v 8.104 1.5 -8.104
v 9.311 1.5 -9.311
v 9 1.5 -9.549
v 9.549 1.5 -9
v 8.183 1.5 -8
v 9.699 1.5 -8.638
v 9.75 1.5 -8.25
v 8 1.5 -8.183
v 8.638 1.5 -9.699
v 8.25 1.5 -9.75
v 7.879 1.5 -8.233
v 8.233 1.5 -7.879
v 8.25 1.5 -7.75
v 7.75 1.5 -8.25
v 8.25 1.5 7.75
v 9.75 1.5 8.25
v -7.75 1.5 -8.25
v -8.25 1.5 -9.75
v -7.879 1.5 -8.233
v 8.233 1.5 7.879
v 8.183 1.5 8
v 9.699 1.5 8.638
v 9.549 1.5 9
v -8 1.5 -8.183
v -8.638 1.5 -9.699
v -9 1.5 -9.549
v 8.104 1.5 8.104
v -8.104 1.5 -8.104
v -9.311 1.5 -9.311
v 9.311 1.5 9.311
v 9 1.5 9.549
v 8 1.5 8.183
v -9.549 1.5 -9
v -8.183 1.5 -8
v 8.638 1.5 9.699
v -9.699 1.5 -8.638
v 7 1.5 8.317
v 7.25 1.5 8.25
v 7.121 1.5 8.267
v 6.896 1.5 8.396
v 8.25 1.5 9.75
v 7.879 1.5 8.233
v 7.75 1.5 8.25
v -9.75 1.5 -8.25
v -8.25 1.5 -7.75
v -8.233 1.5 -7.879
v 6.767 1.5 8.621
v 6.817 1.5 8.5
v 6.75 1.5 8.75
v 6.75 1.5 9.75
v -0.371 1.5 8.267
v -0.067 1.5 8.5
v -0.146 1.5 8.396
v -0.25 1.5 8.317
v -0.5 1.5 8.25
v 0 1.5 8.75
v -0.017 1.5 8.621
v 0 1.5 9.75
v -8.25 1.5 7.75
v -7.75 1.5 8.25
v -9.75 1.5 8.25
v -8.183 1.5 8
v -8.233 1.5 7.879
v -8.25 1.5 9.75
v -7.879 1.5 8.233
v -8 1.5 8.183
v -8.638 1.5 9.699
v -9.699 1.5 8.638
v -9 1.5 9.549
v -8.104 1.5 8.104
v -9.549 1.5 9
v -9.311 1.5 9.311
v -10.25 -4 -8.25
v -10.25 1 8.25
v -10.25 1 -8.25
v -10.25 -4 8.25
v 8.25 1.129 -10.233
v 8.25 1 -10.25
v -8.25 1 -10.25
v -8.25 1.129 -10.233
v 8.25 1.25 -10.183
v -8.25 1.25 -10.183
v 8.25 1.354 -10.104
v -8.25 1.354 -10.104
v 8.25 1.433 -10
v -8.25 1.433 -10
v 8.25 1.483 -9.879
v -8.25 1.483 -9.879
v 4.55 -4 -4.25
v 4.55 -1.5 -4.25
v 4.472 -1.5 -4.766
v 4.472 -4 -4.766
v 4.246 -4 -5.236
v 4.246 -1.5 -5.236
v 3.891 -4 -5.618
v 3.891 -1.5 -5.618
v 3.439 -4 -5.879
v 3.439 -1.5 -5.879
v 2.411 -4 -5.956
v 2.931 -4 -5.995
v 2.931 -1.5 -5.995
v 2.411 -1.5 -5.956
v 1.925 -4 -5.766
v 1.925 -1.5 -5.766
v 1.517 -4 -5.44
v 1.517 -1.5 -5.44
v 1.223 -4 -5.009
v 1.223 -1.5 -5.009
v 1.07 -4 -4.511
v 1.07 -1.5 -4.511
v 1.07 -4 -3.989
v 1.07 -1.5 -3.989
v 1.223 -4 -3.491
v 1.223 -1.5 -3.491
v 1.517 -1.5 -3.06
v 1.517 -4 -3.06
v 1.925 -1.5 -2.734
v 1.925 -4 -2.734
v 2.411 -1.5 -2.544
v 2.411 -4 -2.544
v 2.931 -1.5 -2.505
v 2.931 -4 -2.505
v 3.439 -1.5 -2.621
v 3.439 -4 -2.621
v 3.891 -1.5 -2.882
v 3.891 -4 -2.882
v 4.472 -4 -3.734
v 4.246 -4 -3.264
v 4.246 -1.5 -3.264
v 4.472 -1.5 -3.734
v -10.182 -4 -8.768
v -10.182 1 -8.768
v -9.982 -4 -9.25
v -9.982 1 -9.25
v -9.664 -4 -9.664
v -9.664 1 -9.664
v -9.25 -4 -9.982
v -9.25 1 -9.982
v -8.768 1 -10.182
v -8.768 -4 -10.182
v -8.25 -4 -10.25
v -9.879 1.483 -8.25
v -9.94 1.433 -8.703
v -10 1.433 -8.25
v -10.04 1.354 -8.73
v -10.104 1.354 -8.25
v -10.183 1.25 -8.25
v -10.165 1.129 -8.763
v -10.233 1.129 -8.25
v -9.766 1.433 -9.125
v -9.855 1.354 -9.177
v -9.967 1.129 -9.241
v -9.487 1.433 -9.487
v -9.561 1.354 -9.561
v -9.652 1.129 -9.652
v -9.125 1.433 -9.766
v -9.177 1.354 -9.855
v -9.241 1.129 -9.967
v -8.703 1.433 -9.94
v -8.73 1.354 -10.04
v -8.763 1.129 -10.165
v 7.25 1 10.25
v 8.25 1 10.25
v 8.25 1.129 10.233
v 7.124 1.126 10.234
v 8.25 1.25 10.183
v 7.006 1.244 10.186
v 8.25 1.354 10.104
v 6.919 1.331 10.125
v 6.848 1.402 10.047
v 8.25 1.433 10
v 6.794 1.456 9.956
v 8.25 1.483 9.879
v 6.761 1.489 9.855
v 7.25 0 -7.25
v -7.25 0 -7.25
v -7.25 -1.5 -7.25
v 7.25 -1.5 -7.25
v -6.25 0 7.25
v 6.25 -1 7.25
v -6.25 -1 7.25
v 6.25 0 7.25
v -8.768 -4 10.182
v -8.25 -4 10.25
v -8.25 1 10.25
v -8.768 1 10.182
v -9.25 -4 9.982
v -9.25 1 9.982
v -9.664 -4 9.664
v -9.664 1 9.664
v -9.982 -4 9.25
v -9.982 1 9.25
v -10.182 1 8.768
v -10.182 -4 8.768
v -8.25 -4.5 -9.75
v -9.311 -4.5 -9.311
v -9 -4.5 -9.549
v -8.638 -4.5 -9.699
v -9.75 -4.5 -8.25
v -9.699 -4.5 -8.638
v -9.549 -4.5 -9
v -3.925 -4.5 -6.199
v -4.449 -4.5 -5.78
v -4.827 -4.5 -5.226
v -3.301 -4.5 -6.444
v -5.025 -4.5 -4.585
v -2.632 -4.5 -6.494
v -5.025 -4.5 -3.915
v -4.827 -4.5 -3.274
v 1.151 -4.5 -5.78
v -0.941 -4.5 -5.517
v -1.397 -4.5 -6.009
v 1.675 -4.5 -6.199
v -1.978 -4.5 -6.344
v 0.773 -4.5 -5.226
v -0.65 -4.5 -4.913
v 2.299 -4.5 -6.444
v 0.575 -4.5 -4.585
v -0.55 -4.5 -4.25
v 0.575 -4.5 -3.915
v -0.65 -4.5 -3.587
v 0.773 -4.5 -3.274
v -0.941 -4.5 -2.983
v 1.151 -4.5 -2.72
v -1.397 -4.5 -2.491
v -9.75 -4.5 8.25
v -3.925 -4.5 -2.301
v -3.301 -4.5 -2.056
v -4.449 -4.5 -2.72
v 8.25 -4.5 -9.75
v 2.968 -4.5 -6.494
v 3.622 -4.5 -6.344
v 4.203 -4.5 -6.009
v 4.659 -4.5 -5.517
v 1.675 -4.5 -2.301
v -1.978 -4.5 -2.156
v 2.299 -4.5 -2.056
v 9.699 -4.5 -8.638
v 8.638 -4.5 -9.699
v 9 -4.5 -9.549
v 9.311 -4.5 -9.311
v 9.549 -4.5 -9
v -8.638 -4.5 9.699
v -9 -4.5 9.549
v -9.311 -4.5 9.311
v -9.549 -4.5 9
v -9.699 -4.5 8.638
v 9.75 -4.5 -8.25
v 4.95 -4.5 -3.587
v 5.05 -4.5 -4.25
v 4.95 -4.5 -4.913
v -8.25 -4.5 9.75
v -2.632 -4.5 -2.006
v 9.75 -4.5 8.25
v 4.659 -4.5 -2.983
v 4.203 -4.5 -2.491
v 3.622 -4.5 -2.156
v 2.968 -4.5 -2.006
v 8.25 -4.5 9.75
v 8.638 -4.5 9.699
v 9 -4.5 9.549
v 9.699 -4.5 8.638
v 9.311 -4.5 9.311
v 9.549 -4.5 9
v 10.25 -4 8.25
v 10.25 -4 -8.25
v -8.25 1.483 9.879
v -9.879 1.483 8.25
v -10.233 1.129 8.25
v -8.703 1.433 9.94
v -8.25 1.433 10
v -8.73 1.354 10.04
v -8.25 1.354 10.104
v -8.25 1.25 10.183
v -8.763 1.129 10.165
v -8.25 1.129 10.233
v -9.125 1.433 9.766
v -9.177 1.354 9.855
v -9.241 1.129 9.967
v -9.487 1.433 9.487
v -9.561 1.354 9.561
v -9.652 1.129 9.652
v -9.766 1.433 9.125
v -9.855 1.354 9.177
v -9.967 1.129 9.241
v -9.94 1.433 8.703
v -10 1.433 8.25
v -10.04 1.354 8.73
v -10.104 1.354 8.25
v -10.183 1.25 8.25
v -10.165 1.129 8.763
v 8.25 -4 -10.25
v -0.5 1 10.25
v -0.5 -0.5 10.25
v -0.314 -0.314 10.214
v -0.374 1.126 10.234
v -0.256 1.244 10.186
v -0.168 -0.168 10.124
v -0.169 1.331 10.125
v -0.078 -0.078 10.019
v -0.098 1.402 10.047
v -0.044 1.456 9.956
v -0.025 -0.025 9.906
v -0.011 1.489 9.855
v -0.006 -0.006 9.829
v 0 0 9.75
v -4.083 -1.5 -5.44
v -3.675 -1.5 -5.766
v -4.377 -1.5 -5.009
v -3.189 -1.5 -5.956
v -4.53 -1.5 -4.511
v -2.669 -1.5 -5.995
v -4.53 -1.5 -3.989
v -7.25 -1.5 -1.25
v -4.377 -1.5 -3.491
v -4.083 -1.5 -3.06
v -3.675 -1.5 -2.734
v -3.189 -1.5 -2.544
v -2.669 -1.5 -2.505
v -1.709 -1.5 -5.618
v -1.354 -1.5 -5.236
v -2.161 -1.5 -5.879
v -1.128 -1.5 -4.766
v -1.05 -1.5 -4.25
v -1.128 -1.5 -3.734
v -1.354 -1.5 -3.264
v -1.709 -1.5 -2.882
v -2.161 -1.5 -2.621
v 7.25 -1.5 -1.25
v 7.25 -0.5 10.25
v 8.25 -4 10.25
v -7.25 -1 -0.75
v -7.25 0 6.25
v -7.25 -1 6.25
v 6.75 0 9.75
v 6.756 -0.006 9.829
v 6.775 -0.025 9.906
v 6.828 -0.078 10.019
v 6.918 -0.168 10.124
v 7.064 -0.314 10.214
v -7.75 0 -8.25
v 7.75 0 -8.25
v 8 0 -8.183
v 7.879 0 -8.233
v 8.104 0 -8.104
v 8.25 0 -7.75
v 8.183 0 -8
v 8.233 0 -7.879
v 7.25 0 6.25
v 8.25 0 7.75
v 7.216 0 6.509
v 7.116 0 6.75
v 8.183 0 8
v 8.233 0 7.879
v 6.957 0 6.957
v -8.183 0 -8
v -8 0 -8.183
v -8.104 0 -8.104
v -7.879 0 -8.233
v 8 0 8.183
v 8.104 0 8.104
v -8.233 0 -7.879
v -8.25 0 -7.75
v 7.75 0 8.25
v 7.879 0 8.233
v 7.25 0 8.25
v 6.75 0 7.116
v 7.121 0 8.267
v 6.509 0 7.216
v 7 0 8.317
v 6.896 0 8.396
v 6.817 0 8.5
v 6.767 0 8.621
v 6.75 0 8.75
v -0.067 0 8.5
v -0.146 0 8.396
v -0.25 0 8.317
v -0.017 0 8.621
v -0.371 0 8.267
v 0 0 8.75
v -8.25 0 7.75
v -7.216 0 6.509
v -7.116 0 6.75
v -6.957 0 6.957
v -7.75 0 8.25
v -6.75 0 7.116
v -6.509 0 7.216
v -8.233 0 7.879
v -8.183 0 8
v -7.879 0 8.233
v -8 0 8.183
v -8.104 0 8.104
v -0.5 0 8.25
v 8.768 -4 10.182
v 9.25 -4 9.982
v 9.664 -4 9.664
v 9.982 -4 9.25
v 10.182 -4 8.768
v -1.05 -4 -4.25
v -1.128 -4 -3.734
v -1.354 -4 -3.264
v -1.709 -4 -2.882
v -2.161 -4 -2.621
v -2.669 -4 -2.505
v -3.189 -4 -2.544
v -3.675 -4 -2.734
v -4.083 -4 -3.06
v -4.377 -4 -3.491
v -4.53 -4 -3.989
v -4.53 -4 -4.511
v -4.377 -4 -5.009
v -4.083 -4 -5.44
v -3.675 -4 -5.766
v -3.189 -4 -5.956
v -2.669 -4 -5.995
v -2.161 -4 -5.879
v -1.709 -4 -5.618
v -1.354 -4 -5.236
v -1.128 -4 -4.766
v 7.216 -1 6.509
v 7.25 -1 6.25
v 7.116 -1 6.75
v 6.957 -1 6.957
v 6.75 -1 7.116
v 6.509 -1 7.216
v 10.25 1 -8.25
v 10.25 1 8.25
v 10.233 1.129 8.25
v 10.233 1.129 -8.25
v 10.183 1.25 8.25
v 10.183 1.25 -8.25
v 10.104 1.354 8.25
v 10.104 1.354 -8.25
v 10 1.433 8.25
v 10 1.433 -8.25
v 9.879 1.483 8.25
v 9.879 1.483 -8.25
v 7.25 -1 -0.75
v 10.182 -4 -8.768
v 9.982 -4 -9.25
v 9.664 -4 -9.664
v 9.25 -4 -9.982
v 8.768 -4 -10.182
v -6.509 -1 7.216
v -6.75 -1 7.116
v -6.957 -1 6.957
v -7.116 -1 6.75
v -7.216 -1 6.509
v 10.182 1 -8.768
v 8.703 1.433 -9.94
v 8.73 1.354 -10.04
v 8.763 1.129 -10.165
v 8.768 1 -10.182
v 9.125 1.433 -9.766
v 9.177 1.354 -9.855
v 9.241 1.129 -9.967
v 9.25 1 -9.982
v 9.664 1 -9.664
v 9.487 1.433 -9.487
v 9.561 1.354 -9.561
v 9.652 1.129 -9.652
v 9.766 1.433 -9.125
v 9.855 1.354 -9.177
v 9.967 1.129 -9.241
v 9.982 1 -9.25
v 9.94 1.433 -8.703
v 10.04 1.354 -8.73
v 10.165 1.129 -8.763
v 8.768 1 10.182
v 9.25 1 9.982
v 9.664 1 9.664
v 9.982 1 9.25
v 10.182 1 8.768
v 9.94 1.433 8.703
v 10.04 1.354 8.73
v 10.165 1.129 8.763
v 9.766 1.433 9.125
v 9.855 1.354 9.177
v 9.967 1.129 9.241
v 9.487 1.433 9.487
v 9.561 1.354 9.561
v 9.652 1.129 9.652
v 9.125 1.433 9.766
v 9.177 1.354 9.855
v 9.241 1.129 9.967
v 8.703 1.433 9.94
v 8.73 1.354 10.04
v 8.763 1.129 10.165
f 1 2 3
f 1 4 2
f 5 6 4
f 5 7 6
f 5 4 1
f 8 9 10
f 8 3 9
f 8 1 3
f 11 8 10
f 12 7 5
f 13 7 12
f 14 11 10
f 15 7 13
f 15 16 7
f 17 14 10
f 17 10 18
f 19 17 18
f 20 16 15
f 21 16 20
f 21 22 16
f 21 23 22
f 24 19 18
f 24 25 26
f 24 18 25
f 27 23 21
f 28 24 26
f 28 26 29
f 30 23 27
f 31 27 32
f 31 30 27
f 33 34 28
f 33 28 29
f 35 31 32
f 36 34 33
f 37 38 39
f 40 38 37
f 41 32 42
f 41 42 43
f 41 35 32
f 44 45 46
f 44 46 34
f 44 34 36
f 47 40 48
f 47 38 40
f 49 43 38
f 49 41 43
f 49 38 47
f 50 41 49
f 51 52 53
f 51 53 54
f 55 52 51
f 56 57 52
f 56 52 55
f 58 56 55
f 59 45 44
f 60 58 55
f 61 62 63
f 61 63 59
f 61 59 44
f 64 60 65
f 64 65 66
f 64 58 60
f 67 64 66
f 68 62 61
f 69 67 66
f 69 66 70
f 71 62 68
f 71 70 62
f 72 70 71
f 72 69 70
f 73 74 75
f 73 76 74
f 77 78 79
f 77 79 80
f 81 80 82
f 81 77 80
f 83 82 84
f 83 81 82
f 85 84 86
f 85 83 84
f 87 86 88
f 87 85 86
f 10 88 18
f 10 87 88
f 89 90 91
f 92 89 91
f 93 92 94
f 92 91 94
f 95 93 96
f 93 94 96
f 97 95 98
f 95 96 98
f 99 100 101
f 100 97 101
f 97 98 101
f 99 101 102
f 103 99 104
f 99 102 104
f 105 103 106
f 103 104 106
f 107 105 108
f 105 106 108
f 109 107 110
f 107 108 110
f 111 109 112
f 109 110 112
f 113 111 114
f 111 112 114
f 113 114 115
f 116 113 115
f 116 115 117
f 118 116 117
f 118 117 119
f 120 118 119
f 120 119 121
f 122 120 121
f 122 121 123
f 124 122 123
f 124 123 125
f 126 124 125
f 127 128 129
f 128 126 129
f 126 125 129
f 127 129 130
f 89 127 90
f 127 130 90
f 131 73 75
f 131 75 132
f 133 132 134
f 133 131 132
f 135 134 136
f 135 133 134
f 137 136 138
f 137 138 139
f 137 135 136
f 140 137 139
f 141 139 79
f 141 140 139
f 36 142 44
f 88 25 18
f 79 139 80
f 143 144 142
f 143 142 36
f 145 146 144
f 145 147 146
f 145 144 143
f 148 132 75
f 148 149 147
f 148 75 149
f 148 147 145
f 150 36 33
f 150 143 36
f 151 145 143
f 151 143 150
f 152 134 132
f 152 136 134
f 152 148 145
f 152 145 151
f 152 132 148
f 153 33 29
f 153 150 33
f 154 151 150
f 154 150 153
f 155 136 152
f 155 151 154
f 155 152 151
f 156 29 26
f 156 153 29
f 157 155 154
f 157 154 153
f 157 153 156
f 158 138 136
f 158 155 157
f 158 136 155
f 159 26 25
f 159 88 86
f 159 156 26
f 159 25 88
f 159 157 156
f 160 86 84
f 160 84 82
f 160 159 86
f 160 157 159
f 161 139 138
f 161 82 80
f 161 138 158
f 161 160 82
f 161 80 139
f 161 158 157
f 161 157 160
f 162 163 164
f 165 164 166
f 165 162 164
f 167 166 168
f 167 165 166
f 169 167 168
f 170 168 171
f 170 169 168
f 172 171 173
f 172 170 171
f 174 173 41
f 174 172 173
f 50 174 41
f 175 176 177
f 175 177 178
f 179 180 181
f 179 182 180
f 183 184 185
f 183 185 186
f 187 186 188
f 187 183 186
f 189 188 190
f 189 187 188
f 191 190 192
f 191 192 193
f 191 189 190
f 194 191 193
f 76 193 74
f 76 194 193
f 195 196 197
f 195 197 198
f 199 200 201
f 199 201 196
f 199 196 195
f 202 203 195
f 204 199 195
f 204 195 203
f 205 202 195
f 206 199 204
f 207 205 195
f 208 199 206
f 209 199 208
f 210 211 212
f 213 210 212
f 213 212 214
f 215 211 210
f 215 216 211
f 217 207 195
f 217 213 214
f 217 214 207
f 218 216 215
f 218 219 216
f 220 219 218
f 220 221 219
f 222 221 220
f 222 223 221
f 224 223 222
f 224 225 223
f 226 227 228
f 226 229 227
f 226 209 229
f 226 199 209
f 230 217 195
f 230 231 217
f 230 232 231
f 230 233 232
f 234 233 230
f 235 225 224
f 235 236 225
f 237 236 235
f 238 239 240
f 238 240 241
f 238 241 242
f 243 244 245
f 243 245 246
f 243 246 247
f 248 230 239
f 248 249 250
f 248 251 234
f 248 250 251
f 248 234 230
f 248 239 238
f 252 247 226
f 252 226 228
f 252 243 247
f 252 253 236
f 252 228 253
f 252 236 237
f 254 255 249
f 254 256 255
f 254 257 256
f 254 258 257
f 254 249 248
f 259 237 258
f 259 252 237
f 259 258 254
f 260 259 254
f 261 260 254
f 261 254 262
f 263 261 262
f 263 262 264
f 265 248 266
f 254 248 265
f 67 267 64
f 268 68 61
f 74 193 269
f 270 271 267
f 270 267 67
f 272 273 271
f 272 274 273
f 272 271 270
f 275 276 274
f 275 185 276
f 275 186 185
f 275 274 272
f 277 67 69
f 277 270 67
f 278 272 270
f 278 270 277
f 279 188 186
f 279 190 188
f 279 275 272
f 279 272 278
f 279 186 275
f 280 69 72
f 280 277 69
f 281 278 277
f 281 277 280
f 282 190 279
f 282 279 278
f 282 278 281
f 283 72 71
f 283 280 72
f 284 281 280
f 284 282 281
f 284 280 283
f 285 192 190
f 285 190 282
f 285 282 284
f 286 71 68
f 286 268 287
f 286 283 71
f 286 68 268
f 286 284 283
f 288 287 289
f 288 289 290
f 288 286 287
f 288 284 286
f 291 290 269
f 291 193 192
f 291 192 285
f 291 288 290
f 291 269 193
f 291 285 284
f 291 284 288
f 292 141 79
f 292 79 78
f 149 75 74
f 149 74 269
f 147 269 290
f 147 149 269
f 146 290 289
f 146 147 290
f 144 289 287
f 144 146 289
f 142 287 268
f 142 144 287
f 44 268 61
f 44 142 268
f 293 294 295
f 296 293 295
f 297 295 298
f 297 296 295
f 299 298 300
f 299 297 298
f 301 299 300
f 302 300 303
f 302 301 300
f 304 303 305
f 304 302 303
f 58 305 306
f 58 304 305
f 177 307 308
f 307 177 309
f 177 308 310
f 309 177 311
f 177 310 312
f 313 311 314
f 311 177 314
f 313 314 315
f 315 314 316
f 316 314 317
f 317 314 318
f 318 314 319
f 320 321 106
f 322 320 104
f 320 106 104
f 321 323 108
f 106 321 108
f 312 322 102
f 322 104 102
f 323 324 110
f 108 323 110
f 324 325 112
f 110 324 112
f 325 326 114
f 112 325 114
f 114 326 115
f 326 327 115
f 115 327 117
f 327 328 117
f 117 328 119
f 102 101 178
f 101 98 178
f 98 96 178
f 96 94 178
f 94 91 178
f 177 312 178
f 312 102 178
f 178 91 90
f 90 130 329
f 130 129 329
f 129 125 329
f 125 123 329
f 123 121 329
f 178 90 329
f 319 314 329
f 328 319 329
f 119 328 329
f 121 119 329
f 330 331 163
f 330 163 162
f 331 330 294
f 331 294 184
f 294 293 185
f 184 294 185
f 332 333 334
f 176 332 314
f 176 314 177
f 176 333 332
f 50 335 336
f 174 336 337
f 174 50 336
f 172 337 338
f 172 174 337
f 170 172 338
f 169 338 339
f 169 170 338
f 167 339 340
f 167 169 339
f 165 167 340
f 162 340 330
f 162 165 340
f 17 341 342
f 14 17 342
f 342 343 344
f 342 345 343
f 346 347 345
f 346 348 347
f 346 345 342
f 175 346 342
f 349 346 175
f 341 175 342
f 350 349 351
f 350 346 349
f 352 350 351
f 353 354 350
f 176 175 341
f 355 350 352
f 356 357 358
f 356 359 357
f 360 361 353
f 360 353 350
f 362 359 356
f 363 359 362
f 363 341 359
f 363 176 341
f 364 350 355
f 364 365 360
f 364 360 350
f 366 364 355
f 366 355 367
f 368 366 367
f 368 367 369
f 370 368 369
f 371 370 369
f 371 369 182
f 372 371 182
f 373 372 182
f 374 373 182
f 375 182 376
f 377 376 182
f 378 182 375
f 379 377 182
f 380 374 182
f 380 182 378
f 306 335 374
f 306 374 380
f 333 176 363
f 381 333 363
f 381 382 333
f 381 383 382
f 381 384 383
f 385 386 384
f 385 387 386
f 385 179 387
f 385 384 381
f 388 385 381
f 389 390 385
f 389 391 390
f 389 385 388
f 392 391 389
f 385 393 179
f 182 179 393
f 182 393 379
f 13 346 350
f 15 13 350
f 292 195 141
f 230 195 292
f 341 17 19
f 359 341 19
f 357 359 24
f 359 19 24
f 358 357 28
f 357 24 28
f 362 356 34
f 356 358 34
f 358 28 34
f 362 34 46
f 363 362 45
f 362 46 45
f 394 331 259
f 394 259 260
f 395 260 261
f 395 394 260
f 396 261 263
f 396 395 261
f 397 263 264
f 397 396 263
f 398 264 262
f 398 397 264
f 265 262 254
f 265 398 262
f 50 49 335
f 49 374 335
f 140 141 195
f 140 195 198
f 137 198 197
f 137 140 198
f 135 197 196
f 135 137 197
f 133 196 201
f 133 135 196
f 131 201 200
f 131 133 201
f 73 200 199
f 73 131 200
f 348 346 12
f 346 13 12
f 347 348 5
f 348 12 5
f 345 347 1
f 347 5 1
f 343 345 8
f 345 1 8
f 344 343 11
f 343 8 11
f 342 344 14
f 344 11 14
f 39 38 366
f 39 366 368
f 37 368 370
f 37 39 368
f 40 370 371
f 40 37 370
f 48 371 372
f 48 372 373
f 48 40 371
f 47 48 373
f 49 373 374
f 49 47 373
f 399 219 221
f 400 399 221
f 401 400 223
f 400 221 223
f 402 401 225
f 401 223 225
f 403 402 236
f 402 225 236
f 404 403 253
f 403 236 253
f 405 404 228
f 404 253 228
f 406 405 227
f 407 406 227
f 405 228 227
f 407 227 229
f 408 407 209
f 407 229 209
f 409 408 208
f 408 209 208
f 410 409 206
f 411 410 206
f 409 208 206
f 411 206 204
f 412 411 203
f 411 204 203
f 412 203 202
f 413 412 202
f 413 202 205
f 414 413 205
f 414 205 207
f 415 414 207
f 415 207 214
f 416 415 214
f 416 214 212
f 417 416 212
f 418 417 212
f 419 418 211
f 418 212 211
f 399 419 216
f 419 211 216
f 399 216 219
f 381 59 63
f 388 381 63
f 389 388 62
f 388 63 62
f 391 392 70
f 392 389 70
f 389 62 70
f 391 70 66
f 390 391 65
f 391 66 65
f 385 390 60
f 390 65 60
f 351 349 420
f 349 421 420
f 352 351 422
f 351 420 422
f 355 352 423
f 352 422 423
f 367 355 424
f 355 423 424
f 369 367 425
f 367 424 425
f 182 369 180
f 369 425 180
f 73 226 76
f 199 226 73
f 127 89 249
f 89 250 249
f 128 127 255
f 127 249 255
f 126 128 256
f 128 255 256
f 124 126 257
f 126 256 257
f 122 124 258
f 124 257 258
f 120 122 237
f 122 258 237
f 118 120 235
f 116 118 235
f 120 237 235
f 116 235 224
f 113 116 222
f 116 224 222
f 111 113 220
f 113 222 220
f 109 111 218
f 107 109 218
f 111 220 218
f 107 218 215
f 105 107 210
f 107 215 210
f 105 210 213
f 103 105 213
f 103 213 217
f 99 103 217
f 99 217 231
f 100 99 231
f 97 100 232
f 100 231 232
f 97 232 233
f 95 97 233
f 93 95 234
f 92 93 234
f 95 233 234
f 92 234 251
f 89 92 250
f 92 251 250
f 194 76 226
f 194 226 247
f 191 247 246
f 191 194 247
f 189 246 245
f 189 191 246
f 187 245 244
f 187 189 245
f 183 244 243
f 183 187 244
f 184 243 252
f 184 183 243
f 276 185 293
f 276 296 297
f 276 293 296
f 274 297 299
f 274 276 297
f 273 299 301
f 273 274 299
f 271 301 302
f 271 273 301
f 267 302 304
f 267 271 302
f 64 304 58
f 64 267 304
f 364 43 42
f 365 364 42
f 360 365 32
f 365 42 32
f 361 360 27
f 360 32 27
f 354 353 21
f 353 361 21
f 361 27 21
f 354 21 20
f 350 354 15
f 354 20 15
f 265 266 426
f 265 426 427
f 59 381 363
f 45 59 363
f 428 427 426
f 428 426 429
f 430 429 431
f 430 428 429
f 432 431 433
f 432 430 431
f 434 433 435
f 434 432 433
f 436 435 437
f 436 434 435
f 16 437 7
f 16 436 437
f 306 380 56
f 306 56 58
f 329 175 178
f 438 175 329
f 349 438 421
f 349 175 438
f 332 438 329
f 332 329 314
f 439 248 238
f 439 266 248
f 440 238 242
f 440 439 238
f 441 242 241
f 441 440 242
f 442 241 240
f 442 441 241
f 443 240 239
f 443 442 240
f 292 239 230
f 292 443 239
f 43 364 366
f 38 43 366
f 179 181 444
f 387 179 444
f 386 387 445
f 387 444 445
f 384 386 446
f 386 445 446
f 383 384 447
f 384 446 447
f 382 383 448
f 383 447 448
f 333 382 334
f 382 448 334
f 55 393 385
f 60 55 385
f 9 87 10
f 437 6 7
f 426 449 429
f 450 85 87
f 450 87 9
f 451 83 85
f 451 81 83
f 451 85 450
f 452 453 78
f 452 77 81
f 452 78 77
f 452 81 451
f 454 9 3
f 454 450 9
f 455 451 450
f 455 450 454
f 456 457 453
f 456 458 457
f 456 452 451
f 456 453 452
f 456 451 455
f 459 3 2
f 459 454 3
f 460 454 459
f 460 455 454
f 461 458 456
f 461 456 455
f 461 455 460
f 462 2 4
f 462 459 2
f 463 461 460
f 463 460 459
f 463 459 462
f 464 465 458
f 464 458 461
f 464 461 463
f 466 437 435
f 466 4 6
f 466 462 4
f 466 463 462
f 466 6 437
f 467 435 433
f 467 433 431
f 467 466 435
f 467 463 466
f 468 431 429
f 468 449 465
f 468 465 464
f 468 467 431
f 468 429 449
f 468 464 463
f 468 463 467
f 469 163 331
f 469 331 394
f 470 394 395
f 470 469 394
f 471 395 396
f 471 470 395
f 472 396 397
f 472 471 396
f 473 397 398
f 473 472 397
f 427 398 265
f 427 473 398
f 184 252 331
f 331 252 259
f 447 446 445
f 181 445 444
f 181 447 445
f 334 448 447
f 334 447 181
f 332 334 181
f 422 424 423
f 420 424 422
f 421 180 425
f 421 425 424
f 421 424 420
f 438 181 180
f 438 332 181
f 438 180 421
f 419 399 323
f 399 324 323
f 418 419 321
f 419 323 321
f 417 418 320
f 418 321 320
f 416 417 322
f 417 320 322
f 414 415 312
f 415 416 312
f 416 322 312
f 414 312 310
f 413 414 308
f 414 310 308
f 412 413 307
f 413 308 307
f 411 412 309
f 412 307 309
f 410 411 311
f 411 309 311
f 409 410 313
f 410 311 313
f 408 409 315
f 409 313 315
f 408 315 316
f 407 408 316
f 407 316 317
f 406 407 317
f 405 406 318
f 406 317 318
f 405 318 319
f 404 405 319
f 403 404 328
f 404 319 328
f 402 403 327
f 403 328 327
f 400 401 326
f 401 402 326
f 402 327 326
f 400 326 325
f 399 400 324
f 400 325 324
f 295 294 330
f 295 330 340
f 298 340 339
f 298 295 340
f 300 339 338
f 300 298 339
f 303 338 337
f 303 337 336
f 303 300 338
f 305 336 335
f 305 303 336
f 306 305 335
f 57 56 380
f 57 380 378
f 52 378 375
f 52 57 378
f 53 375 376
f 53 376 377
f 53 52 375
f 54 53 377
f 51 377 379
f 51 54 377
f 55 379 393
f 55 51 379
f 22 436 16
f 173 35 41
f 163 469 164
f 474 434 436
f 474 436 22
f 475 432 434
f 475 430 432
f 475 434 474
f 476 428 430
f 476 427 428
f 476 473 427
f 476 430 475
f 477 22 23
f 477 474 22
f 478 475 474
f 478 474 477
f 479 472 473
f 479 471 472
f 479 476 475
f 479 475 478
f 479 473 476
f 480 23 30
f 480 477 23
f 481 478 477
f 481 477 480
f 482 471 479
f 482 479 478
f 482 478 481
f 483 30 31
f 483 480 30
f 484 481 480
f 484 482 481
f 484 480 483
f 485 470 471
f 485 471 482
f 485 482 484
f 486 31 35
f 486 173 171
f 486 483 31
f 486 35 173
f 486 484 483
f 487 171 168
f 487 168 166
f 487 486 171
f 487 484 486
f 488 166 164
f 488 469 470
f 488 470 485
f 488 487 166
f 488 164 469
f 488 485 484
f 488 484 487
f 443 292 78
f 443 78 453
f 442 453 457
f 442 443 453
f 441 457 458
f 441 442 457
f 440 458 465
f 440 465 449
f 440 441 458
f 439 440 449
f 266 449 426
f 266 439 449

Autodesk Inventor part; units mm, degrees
ref_plane "YZ Plane" through (0, 0, 0) normal (1, 0, 0) x (0, 1, 0)
ref_plane "XZ Plane" through (0, 0, 0) normal (0, 1, 0) x (-1, 0, 0)
ref_plane "XY Plane" through (0, 0, 0) normal (0, 0, 1) x (1, 0, 0)
sketch "Sketch1" plane through (0, 0, 0) normal (0, 1, 0) x (-1, 0, 0)
  line L0 (8, 8) -> (-8, 8) construction
  line L1 (-8, 8) -> (-8, -8) construction
  line L2 (-8, -8) -> (8, -8) construction
  line L3 (8, -8) -> (8, 8) construction
  line L4 (8, 8) -> (-8, -8) construction
  line L5 (-8, 8) -> (8, -8) construction
  line L6 (-8.25, 8.25) -> (8.25, 8.25)
  line L7 (8.25, 8.25) -> (8.25, -8.25)
  line L8 (8.25, -8.25) -> (-8.25, -8.25)
  line L9 (-8.25, -8.25) -> (-8.25, 8.25)
  line L10 (-8.25, 8.25) -> (8.25, -8.25) construction
  line L11 (8.25, 8.25) -> (-8.25, -8.25) construction
  line L12 (-10.25, 10.25) -> (10.25, 10.25)
  line L13 (10.25, 10.25) -> (10.25, -10.25)
  line L14 (10.25, -10.25) -> (-10.25, -10.25)
  line L15 (-10.25, -10.25) -> (-10.25, 10.25)
  line L16 (-10.25, 10.25) -> (10.25, -10.25) construction
  line L17 (10.25, 10.25) -> (-10.25, -10.25) construction
  circle A0 centre (2.8, -4.25) radius 1.75
  circle A1 centre (-2.8, -4.25) radius 1.75
  line L18 (7.25, -7.25) -> (-7.25, -7.25)
  line L19 (-7.25, -1.25) -> (7.25, -1.25)
  line L20 (7.25, -1.25) -> (7.25, -7.25)
  line L21 (-7.25, -1.25) -> (-7.25, -7.25)
  line L22 (-6.75, 8.25) -> (-6.75, 10.25)
  line L23 (0, 8.25) -> (0, 10.25)
  point P0 (0, 0)
  point P1 (0, -1.25)
  point P2 (7.25, -4.25)
  dimension "d0" = 16
  dimension "d1" = 16.5
  dimension "d2" = 2
  dimension "d3" = 3.5
  dimension "d4" = 5.6
  dimension "d5" = 2.8
  dimension "d6" = 6
  dimension "d7" = 1
  dimension "d8" = 1
  dimension "d15" = 1.5
extrude "Extrusion1" add sketch "Sketch1" along normal blind 1.5 contours L9 L8 L7 L6 L23 L12 L13 L14 L15 L22
extrude "Extrusion2" add sketch "Sketch1" against normal blind 1.5 contours L9 L8 L7 L6 L23 L12 L13 L14 L15 L22 | L6 L7 L8 L9 | L22 L12 L23 L6
sketch "Sketch2" plane through (0, -1.5, 0) normal (0, -1, 0) x (1, 0, 0)
  line L0 (-10.25, -10.25) -> (10.25, -10.25) projected
  line L1 (10.25, -10.25) -> (10.25, 10.25) projected
  line L2 (10.25, 10.25) -> (-10.25, 10.25) projected
  line L3 (-10.25, 10.25) -> (-10.25, -10.25) projected
  line L4 (-7.25, -1.25) -> (7.25, -1.25) projected
  line L5 (7.25, -1.25) -> (7.25, -7.25) projected
  line L6 (7.25, -7.25) -> (-7.25, -7.25) projected
  line L7 (-7.25, -7.25) -> (-7.25, -1.25) projected
  circle A0 centre (2.8, -4.25) radius 1.75 projected
  circle A1 centre (-2.8, -4.25) radius 1.75 projected
  point P0 (0, 0)
extrude "Extrusion3" add sketch "Sketch2" along normal blind 3 contours L3 L2 L1 L0 | L4 L5 L6 L7
fillet "Fillet2" radius 2 4 edges at (-10.25, -1.5, 10.25) (-10.25, -1.5, -10.25) (10.25, -1.5, -10.25) (10.25, -1.5, 10.25)
fillet "Fillet3" radius 0.5 18 edges at (-9.6642, 1.5, 9.6642) (-4.125, 1.5, 10.25) (-9.6642, 1.5, -9.6642) (0, 1.5, -10.25) (9.6642, 1.5, -9.6642) (10.25, 1.5, 0) (9.6642, 1.5, 9.6642) (7.5, 1.5, 10.25) (-10.25, 1.5, 0) (0, 0.75, 10.25) (3.375, 0, 10.25) (6.75, 0.75, 10.25) (-8.25, 0.75, 8.25) (-8.25, 0.75, -8.25) (8.25, 0.75, -8.25) (8.25, 0.75, 8.25) (6.75, 0.75, 8.25) (0, 0.75, 8.25)
chamfer "Chamfer1" distance 0.5 angle 45 10 edges at (1.05, -4.5, -4.25) (-4.55, -4.5, -4.25) (0, -4.5, 10.25) (-9.6642, -4.5, 9.6642) (-10.25, -4.5, 0) (-9.6642, -4.5, -9.6642) (0, -4.5, -10.25) (9.6642, -4.5, -9.6642) (10.25, -4.5, 0) (9.6642, -4.5, 9.6642)
sketch "Sketch3" plane through (0, 0, 0) normal (0, 1, 0) x (1, 0, 0)
  line L0 (7.25, 1.25) -> (-7.25, 1.25) projected
  line L1 (-7.25, 1.25) -> (-7.25, 7.25) projected
  line L2 (-7.25, 7.25) -> (7.25, 7.25) projected
  line L3 (7.25, 7.25) -> (7.25, 1.25) projected
  arc A0 (7.75, -8.25) -> (8.25, -7.75) centre (7.75, -7.75) ccw projected
  line L4 (8.25, 7.75) -> (8.25, -7.75) projected
  arc A1 (8.25, 7.75) -> (7.75, 8.25) centre (7.75, 7.75) ccw projected
  line L5 (-7.75, 8.25) -> (7.75, 8.25) projected
  arc A2 (-7.75, 8.25) -> (-8.25, 7.75) centre (-7.75, 7.75) ccw projected
  line L6 (-8.25, -7.75) -> (-8.25, 7.75) projected
  arc A3 (-8.25, -7.75) -> (-7.75, -8.25) centre (-7.75, -7.75) ccw projected
  line L7 (-0.5, -8.25) -> (-7.75, -8.25) projected
  arc A4 (0, -8.75) -> (-0.5, -8.25) centre (-0.5, -8.75) ccw projected
  line L8 (0, -9.75) -> (0, -8.75) projected
  line L9 (6.75, -9.75) -> (0, -9.75) projected
  line L10 (6.75, -8.75) -> (6.75, -9.75) projected
  arc A5 (7.25, -8.25) -> (6.75, -8.75) centre (7.25, -8.75) ccw projected
  line L11 (7.75, -8.25) -> (7.25, -8.25) projected
  line L12 (-7.25, 1.25) -> (7.25, 1.25)
  line L13 (7.25, 1.25) -> (7.25, -7.25)
  line L14 (7.25, -7.25) -> (-7.25, -7.25)
  line L15 (-7.25, -7.25) -> (-7.25, 1.25)
  point P0 (0, 0)
  dimension "d22" = 1
extrude "Extrusion4" cut sketch "Sketch3" against normal blind 1 contours L13 L14 L15 L0
chamfer "Chamfer2" distance 0.5 angle 45 1 edges at (0, -1, -1.25)
fillet "Fillet4" radius 1 2 edges at (-7.25, -0.5, 7.25) (7.25, -0.5, 7.25)
equation "\"d5\" = 0.5 * d4"
equation "\"d8\" = d7"
properties part number "Light Pipe Mount - Top"
